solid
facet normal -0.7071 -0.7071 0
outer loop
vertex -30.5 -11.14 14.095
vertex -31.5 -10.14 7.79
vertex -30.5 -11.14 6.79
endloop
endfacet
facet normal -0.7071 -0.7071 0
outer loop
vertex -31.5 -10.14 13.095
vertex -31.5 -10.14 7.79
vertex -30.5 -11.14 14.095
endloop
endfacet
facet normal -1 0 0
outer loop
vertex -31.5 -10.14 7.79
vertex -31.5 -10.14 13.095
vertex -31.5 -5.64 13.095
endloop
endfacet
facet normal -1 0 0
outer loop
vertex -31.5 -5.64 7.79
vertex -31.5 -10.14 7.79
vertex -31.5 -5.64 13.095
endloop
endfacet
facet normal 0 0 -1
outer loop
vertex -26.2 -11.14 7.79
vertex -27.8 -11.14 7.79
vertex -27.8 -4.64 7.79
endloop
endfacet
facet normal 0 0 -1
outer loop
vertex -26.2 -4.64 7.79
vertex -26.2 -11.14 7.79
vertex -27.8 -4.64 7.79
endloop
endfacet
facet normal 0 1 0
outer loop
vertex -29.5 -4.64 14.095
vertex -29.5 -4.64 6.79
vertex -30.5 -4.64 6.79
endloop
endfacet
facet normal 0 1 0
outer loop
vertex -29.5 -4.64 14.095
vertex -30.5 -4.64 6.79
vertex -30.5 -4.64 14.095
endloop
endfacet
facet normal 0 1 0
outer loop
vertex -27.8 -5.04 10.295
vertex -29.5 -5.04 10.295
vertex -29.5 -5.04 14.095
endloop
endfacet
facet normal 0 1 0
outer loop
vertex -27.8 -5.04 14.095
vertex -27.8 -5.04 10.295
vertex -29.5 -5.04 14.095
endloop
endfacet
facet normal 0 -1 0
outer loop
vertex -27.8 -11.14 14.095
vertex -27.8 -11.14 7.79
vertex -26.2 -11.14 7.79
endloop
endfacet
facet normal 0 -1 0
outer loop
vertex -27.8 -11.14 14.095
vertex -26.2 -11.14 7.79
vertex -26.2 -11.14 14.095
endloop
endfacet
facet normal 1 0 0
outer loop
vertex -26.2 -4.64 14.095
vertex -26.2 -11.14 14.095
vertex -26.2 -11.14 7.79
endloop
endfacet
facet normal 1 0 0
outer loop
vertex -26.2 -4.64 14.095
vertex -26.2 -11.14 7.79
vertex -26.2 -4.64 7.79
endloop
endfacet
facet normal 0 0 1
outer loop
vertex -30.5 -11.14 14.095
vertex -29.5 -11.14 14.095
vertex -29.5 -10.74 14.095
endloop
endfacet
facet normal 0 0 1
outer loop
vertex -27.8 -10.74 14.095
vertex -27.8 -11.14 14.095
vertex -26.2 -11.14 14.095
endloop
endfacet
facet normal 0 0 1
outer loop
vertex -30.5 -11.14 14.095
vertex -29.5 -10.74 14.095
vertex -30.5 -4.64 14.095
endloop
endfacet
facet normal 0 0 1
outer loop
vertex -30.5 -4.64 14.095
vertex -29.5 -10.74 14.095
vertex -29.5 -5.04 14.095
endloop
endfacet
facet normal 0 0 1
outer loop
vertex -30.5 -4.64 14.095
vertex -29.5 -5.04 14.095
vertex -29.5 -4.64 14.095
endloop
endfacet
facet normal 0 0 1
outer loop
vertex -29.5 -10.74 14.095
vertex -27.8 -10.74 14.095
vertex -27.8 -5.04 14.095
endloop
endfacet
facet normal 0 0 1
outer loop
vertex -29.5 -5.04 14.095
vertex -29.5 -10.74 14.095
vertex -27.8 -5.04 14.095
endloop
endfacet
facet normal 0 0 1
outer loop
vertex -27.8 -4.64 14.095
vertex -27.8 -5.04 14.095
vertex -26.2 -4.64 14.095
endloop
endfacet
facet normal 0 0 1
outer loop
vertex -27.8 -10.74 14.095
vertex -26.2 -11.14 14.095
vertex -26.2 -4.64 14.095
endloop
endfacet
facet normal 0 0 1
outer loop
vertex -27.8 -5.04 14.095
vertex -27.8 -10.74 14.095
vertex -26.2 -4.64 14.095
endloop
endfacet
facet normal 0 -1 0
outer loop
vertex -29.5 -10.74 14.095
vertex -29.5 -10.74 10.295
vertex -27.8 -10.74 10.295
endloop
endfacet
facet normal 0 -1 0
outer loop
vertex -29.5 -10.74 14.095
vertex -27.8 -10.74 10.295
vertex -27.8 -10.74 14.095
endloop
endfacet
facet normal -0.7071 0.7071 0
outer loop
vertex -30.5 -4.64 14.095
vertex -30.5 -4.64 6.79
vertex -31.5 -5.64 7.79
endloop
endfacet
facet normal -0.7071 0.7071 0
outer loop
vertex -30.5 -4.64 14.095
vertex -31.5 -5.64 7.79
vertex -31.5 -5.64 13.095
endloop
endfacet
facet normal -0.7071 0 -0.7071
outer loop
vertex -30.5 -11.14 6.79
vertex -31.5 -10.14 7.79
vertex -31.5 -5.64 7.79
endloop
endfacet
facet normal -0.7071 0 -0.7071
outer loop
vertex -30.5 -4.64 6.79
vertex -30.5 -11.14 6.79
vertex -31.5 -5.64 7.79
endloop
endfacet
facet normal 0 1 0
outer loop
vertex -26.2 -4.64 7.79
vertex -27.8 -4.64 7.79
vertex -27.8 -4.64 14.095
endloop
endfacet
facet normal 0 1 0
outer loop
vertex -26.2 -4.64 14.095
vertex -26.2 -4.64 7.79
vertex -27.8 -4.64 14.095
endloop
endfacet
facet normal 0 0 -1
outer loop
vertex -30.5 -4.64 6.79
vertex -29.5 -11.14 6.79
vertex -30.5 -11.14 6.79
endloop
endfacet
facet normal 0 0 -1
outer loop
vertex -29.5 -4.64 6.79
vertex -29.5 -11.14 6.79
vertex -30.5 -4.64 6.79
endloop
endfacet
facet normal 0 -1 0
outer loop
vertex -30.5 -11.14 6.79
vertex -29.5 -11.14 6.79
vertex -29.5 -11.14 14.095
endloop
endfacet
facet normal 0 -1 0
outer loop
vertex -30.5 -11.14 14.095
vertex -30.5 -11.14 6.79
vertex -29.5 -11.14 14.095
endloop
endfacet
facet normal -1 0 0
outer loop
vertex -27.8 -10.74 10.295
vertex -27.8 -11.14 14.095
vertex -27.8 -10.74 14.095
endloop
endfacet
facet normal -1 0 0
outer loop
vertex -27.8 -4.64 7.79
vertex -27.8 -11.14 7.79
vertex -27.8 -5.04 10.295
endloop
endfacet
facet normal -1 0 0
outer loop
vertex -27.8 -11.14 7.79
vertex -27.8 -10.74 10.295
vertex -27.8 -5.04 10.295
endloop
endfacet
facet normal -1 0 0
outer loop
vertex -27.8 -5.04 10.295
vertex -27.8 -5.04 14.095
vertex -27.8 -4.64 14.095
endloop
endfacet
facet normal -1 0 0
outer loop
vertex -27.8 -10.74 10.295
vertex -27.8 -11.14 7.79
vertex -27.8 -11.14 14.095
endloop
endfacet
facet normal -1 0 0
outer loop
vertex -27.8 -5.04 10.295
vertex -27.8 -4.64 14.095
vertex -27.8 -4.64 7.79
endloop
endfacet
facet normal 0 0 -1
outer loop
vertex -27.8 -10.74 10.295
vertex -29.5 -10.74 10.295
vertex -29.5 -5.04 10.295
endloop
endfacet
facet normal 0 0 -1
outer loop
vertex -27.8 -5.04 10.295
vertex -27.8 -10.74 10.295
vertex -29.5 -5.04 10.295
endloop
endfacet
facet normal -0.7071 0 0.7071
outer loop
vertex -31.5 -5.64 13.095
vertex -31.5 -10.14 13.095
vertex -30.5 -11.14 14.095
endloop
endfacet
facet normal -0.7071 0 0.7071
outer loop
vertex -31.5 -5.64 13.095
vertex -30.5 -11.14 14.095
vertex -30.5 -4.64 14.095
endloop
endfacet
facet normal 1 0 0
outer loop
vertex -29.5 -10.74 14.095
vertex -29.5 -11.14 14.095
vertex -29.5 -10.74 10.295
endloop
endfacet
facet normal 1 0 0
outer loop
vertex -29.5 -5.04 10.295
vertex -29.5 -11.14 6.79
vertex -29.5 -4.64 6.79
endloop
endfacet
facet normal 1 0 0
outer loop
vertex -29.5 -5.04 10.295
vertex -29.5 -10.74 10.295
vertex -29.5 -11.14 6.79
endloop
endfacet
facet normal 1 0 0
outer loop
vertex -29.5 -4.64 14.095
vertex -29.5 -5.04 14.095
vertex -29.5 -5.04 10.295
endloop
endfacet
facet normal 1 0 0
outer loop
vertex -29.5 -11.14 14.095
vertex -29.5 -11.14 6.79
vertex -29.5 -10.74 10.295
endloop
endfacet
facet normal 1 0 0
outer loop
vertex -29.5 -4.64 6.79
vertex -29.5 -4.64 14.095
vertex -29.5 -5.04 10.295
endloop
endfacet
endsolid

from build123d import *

# Parameters (mm, degrees)
SKETCH126_W  = 5.7
SKETCH126_H  = 3.8
PAD061_DEPTH = 1.7
SKETCH127_W  = 6.5
SKETCH127_H  = 6.305
PAD062_DEPTH = 1.6
SKETCH128_W  = 6.5
SKETCH128_H  = 7.305
PAD063_DEPTH = 2
CHAMFER_SIZE = 1


with BuildPart() as part:
    # Sketch126 → Pad061 (new body)
    with BuildSketch(Plane.YZ):
        with Locations((-7.89, 12.195)):
            Rectangle(SKETCH126_W, SKETCH126_H)
    extrude(amount=PAD061_DEPTH)

    # Sketch127 → Pad062 (join)
    with BuildSketch(Plane.YZ.offset(1.7)):
        with Locations((-7.89, 10.9425)):
            Rectangle(SKETCH127_W, SKETCH127_H)
    extrude(amount=PAD062_DEPTH)

    # Sketch128 → Pad063 (join)
    with BuildSketch(Plane.YZ):
        with Locations((-7.89, 10.4425)):
            Rectangle(SKETCH128_W, SKETCH128_H)
    extrude(amount=-PAD063_DEPTH)

    # Chamfer
    chamfer_edges = [part.edges().sort_by_distance(p)[0] for p in [
        (-2, -7.89, 14.095),
        (-2, -11.14, 10.4425),
        (-2, -7.89, 6.79),
        (-2, -4.64, 10.4425),
    ]]
    chamfer(chamfer_edges, length=CHAMFER_SIZE)


with BuildPart() as part_1:
    # Body017 placement: moved
    add(part.part.moved(Location((-29.5, 0, 0))))


solid = part_1.part
